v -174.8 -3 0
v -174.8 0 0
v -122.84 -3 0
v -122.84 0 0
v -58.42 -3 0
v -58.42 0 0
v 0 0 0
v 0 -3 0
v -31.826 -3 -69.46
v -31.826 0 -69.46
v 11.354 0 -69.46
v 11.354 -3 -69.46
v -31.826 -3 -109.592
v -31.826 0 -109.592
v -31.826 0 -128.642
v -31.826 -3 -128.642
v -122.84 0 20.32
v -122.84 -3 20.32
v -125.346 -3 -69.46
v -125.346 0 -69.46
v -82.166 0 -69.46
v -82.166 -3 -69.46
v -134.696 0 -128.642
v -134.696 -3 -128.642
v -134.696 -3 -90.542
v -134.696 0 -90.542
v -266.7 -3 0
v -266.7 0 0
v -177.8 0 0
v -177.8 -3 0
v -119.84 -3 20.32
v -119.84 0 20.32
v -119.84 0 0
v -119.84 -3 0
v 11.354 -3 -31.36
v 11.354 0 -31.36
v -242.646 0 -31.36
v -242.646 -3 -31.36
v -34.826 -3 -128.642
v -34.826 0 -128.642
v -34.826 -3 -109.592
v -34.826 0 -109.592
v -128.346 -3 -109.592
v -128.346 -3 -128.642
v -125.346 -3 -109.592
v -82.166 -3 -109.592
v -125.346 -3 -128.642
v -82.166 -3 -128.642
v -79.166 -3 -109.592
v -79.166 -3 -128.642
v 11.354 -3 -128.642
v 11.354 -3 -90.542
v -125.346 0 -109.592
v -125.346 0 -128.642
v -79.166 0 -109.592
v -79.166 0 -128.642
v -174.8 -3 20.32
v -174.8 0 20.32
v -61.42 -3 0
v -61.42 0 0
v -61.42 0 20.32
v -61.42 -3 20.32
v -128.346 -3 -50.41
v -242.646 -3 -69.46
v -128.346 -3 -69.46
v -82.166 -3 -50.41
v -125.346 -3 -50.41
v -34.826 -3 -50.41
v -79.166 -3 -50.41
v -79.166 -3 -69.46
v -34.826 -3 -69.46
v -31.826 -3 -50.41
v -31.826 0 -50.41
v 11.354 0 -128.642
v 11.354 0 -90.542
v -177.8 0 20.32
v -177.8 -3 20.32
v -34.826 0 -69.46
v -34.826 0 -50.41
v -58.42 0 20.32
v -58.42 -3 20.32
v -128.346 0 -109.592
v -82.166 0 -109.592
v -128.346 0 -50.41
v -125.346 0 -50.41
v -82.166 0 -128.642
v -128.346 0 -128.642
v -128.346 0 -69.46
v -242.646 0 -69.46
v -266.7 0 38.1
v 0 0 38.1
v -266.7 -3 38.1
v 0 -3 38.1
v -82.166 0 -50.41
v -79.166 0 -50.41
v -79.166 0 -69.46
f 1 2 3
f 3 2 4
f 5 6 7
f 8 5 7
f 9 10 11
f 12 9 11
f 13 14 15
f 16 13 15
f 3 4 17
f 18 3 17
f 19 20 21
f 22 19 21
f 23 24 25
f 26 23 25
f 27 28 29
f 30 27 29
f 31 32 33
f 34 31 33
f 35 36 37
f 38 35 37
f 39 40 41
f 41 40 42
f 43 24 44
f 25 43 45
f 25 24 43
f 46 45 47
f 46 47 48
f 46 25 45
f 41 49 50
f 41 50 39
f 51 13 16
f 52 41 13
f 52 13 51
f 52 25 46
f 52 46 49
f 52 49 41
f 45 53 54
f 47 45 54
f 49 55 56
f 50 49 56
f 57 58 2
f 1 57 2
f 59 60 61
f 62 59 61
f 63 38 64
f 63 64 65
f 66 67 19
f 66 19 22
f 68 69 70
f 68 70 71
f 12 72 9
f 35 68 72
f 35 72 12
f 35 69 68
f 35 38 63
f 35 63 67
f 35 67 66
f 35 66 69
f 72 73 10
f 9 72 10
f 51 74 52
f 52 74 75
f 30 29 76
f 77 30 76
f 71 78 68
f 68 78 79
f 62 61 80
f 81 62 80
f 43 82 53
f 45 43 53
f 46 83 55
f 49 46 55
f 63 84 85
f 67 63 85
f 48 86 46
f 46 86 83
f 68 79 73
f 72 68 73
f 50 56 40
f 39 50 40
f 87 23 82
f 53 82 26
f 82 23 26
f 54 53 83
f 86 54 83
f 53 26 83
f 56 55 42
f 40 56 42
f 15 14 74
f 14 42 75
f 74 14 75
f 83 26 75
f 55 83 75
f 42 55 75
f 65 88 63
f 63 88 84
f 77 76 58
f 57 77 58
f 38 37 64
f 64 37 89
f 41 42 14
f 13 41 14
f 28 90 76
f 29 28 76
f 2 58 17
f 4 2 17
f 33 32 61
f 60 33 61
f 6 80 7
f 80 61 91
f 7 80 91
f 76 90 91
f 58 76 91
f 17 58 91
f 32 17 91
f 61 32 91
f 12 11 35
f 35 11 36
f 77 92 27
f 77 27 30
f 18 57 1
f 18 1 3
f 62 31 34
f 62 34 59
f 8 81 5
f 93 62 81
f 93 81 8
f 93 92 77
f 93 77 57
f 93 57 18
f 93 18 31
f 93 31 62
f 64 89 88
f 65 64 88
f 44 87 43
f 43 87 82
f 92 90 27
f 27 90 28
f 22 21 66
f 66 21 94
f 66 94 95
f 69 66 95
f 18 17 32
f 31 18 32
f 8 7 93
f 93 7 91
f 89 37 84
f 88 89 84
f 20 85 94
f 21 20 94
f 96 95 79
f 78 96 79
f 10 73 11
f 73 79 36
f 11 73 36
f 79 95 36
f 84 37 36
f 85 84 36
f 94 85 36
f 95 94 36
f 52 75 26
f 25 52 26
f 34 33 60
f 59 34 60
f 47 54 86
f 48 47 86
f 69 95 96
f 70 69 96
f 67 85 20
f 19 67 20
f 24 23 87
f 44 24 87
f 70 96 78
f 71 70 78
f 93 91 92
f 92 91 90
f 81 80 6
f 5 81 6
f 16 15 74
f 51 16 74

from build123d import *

# Parameters (mm, degrees)
F1_DEPTH = 3
F3_DEPTH = 3
F5_W     = 107.95
F5_H     = 38.1
F6_DEPTH = 25.4


with BuildPart() as f1:
    # F0 (on Front) → F1 (new body)
    with BuildSketch(Plane.XZ):
        Polygon((-58.42, 0), (0, 0), (0, 38.1), (-266.7, 38.1), (-266.7, 0), (-177.8, 0), (-177.8, 20.32), (-174.8, 20.32), (-174.8, 0), (-122.84, 0), (-122.84, 20.32), (-119.84, 20.32), (-119.84, 0), (-61.42, 0), (-61.42, 20.32), (-58.42, 20.32), align=None)
    extrude(amount=F1_DEPTH)


with BuildPart() as f3:
    # F2 (on Front) → F3 (new body)
    with BuildSketch(Plane.XZ):
        Polygon((11.3536544591, -31.3604824736), (-242.6463455409, -31.3604824736), (-242.6463455409, -69.4604824736), (-128.3463455409, -69.4604824736), (-128.3463455409, -50.4104824736), (-125.3463455409, -50.4104824736), (-125.3463455409, -69.4604824736), (-82.1663455409, -69.4604824736), (-82.1663455409, -50.4104824736), (-79.1663455409, -50.4104824736), (-79.1663455409, -69.4604824736), (-34.8263455409, -69.4604824736), (-34.8263455409, -50.4104824736), (-31.8263455409, -50.4104824736), (-31.8263455409, -69.4604824736), (11.3536544591, -69.4604824736), align=None)
    extrude(amount=F3_DEPTH)


with BuildPart() as f4_1:
    # F4: copy of F3
    add(f3.part.moved(Location((0, 0, -59.182))))

    # F5 (on face) → F6 (cut)
    with BuildSketch(Plane.XZ.offset(3)):
        with Locations((-188.6713455409, -109.5924824736)):
            Rectangle(F5_W, F5_H)
    extrude(amount=-F6_DEPTH, mode=Mode.SUBTRACT)


solid = Compound([f1.part, f3.part, f4_1.part])
